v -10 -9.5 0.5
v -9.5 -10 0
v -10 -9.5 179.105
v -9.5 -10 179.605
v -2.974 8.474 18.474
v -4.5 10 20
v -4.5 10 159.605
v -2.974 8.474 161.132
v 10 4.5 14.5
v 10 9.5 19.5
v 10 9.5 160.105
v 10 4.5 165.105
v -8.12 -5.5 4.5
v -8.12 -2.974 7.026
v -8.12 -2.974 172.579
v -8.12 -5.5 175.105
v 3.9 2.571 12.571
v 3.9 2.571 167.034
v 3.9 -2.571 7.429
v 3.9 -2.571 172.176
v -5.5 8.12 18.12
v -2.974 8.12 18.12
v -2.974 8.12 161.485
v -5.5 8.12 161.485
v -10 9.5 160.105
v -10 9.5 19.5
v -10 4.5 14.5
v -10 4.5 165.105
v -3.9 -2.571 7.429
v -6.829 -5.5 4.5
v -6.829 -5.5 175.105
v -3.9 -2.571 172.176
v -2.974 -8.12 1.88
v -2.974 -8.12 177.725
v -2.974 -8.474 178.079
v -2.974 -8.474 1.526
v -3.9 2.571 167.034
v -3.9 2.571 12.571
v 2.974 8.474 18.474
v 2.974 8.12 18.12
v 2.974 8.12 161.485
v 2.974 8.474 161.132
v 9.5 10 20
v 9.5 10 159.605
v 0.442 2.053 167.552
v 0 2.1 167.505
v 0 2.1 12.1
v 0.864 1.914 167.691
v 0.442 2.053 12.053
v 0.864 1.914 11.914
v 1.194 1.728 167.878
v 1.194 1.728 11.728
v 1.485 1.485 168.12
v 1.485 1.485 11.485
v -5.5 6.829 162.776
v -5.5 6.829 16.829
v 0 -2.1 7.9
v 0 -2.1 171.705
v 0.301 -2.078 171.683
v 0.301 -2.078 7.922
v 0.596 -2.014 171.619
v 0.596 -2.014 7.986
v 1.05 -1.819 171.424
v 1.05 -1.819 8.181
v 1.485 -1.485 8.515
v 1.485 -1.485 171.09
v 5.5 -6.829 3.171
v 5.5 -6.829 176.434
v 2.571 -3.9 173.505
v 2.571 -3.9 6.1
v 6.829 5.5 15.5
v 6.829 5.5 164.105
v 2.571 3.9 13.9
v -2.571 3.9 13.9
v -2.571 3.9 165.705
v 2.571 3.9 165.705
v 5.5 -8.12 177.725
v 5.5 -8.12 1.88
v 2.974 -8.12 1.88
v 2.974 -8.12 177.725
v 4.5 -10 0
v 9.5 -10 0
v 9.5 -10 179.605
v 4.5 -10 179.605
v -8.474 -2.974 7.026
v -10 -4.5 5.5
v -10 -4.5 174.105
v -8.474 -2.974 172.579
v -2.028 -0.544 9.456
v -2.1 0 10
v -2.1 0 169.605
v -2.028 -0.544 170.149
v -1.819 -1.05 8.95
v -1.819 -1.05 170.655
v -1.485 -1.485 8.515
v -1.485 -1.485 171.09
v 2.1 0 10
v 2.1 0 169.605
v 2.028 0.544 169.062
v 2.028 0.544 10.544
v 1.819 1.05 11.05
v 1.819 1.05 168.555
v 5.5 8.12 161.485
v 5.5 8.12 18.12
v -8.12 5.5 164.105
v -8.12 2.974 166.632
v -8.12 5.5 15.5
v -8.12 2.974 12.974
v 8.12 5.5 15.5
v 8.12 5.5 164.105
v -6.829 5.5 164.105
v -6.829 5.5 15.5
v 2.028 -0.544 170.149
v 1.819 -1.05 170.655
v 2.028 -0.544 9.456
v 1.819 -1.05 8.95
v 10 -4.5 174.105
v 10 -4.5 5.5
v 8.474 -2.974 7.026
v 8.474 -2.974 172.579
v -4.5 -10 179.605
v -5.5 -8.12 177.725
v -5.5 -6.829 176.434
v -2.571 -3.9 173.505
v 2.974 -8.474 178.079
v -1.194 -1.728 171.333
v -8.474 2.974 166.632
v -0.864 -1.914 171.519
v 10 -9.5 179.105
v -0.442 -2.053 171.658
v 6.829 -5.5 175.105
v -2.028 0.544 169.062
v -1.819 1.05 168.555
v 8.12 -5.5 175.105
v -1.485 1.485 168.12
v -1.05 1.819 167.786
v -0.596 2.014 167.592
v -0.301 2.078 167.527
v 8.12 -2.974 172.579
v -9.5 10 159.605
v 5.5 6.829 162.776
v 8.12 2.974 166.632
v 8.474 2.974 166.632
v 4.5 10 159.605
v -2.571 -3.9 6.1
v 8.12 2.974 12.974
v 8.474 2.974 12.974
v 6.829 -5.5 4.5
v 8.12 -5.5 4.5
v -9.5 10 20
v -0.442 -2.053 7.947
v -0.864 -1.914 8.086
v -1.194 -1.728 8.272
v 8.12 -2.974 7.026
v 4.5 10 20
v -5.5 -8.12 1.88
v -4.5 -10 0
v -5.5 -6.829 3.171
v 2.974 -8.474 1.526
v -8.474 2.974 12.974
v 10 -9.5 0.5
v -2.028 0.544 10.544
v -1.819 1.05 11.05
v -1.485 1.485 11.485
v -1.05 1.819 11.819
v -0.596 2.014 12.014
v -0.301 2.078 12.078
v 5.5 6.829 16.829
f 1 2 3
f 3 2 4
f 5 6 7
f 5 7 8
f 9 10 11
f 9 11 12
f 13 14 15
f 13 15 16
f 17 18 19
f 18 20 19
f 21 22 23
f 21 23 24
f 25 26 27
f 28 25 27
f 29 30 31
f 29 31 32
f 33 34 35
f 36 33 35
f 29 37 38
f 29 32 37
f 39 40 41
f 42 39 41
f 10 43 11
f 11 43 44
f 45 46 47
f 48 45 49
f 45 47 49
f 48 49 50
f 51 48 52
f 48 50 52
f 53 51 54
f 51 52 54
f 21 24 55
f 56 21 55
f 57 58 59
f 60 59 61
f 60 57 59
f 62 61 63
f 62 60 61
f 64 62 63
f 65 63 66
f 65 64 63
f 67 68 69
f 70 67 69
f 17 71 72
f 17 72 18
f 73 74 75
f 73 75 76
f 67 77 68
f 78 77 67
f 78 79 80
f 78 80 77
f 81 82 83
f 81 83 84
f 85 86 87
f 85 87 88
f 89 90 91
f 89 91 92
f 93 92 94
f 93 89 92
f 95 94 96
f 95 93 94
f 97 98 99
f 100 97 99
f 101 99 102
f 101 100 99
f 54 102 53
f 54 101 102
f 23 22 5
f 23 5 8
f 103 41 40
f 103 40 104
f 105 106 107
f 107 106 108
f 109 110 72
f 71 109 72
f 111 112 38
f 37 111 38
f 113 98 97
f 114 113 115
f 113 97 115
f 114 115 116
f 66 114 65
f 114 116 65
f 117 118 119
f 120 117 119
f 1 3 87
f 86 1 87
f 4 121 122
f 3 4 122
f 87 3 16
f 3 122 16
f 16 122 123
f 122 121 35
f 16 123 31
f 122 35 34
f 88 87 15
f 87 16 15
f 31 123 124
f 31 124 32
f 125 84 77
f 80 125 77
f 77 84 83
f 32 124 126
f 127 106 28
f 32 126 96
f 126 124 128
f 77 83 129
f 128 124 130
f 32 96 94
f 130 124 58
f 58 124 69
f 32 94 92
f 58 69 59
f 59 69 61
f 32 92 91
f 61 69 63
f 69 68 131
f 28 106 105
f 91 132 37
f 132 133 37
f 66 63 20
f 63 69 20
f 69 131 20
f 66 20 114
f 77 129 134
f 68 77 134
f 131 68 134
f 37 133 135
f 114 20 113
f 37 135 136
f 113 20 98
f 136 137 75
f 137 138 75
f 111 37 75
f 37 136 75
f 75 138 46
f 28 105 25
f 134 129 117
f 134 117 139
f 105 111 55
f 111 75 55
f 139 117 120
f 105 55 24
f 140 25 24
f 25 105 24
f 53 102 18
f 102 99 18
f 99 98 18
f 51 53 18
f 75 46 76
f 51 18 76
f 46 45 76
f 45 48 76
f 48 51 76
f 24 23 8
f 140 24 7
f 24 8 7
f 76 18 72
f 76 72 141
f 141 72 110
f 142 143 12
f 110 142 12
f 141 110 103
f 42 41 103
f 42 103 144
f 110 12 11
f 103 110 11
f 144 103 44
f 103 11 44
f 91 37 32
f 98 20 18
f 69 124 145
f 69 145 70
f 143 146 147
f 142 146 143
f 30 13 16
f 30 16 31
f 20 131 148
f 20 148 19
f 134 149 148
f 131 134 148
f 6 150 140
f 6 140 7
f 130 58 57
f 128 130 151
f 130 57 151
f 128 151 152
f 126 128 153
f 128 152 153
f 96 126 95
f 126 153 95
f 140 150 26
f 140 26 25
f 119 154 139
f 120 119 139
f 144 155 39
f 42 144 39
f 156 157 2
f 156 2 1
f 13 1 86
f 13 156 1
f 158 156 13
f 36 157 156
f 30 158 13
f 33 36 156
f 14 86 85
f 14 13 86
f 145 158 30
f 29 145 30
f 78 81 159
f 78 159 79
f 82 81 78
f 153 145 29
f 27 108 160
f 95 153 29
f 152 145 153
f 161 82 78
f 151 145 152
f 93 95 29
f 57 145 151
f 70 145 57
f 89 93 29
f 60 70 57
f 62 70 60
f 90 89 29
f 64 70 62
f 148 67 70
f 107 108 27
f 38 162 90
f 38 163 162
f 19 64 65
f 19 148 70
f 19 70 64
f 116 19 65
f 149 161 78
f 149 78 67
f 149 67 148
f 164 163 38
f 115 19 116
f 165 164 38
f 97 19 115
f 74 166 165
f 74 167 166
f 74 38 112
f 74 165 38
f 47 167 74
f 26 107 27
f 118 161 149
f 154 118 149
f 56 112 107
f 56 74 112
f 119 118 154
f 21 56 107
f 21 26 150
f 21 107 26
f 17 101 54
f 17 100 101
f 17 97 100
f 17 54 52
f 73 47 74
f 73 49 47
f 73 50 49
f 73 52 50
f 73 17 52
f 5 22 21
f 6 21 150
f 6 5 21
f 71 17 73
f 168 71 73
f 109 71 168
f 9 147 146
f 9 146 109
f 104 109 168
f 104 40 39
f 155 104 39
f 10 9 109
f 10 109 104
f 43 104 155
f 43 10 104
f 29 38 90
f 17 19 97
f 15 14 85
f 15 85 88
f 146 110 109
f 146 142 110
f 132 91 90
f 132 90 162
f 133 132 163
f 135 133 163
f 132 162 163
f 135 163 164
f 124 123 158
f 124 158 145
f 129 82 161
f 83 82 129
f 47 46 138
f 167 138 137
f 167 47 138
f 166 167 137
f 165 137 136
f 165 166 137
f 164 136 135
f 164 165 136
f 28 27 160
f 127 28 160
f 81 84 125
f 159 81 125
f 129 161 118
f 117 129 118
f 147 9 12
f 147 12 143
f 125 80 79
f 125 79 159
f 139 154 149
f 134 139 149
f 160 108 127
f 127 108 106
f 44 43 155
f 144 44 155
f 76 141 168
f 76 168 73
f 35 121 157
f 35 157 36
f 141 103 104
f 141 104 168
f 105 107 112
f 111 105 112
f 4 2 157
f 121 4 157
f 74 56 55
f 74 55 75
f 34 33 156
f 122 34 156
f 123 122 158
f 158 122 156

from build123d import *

# Parameters (mm, degrees)
BOSS_EXTRUDE1_DEPTH = 179.605122421
CHAMFER2_SIZE       = 0.5
CHAMFER2_SIZE2      = 0.353553391
CHAMFER1_SIZE       = 0.5
CUT_EXTRUDE1_REACH  = 182.992


with BuildPart() as part:
    # Sketch1 → Boss-Extrude1 (new body)
    with BuildSketch(Plane.XY):
        with BuildLine():
            Line((5.5, 6.829360749), (2.570639251, 3.9))
            Line((2.570639251, 3.9), (0, 3.9))
            Line((0, 3.9), (0, 2.1))
            ThreePointArc((0, 2.1), (0.803635208, 1.940147018), (1.48492424, 1.48492424))
            Line((1.48492424, 1.48492424), (10, 10))
            Line((10, 10), (4.5, 10))
            Line((4.5, 10), (2.62, 8.12))
            Line((2.62, 8.12), (5.5, 8.12))
            Line((5.5, 8.12), (5.5, 6.829360749))
        make_face()
    extrude(amount=BOSS_EXTRUDE1_DEPTH)

    # Chamfer2
    chamfer2_edges = [part.edges().sort_by_distance(p)[0] for p in [
        (2.62, 8.12, 89.802561211),
    ]]
    chamfer2_side = [part.faces().sort_by_distance(p)[0] for p in [
        (3.56, 9.06, 89.802561211),
    ]]
    chamfer(chamfer2_edges, length=CHAMFER2_SIZE, length2=CHAMFER2_SIZE2, reference=chamfer2_side[0])

    # Mirror1: part across plane


with BuildPart() as part_1:
    add(part.part)
    add(part.part.mirror(Plane(origin=(10, 10, 179.605122421), x_dir=(0, 0, 1), z_dir=(-0.707106781186544, 0.7071067811865511, 0))))

    # Chamfer1
    chamfer1_edges = [part_1.edges().sort_by_distance(p)[0] for p in [
        (10, 10, 89.802561211),
    ]]
    chamfer(chamfer1_edges, length=CHAMFER1_SIZE)

    # Mirror4: part across plane


with BuildPart() as part_2:
    add(part_1.part)
    add(part_1.part.mirror(Plane(origin=(0, 3.9, 179.605122421), x_dir=(0, 0, 1), z_dir=(1, 0, 0))))

    # Mirror5: part across plane


with BuildPart() as part_3:
    add(part_2.part)
    add(part_2.part.mirror(Plane(origin=(-3.9, 0, 179.605122421), x_dir=(0, 0, 1), z_dir=(0, 1, 0))))

    # Cut-Extrude1: up to this face of the body (flat: up to its plane)
    cut_extrude1_end = Plane(part_3.part.faces().sort_by_distance((-10, 7, 89.802561211))[0])
    # Sketch2 → Cut-Extrude1 (cut, up to the picked face)
    with BuildSketch(Plane(origin=(10, 0, 0), x_dir=(0, 0, -1), z_dir=(1, 0, 0)), mode=Mode.PRIVATE) as cut_extrude1_sk1:
        Polygon((0, -10), (-20, 10), (0, 10), align=None)
    cut_extrude1_tool1 = split(extrude(cut_extrude1_sk1.sketch, amount=-CUT_EXTRUDE1_REACH, mode=Mode.PRIVATE), bisect_by=cut_extrude1_end, keep=Keep.BOTH, mode=Mode.PRIVATE)
    # Sketch2 → Cut-Extrude1 (cut, up to the picked face)
    with BuildSketch(Plane(origin=(10, 0, 0), x_dir=(0, 0, -1), z_dir=(1, 0, 0)), mode=Mode.PRIVATE) as cut_extrude1_sk2:
        Polygon((-159.605122421, 10), (-179.605122421, 10), (-179.605122421, -10), align=None)
    cut_extrude1_tool2 = split(extrude(cut_extrude1_sk2.sketch, amount=-CUT_EXTRUDE1_REACH, mode=Mode.PRIVATE), bisect_by=cut_extrude1_end, keep=Keep.BOTH, mode=Mode.PRIVATE)
    add(cut_extrude1_tool1.solids().sort_by(Axis((10, 3.333333, 6.666667), (-1, 0, 0)))[0], mode=Mode.SUBTRACT)
    add(cut_extrude1_tool2.solids().sort_by(Axis((10, 3.333333, 172.938456), (-1, 0, 0)))[0], mode=Mode.SUBTRACT)


solid = part_3.part
